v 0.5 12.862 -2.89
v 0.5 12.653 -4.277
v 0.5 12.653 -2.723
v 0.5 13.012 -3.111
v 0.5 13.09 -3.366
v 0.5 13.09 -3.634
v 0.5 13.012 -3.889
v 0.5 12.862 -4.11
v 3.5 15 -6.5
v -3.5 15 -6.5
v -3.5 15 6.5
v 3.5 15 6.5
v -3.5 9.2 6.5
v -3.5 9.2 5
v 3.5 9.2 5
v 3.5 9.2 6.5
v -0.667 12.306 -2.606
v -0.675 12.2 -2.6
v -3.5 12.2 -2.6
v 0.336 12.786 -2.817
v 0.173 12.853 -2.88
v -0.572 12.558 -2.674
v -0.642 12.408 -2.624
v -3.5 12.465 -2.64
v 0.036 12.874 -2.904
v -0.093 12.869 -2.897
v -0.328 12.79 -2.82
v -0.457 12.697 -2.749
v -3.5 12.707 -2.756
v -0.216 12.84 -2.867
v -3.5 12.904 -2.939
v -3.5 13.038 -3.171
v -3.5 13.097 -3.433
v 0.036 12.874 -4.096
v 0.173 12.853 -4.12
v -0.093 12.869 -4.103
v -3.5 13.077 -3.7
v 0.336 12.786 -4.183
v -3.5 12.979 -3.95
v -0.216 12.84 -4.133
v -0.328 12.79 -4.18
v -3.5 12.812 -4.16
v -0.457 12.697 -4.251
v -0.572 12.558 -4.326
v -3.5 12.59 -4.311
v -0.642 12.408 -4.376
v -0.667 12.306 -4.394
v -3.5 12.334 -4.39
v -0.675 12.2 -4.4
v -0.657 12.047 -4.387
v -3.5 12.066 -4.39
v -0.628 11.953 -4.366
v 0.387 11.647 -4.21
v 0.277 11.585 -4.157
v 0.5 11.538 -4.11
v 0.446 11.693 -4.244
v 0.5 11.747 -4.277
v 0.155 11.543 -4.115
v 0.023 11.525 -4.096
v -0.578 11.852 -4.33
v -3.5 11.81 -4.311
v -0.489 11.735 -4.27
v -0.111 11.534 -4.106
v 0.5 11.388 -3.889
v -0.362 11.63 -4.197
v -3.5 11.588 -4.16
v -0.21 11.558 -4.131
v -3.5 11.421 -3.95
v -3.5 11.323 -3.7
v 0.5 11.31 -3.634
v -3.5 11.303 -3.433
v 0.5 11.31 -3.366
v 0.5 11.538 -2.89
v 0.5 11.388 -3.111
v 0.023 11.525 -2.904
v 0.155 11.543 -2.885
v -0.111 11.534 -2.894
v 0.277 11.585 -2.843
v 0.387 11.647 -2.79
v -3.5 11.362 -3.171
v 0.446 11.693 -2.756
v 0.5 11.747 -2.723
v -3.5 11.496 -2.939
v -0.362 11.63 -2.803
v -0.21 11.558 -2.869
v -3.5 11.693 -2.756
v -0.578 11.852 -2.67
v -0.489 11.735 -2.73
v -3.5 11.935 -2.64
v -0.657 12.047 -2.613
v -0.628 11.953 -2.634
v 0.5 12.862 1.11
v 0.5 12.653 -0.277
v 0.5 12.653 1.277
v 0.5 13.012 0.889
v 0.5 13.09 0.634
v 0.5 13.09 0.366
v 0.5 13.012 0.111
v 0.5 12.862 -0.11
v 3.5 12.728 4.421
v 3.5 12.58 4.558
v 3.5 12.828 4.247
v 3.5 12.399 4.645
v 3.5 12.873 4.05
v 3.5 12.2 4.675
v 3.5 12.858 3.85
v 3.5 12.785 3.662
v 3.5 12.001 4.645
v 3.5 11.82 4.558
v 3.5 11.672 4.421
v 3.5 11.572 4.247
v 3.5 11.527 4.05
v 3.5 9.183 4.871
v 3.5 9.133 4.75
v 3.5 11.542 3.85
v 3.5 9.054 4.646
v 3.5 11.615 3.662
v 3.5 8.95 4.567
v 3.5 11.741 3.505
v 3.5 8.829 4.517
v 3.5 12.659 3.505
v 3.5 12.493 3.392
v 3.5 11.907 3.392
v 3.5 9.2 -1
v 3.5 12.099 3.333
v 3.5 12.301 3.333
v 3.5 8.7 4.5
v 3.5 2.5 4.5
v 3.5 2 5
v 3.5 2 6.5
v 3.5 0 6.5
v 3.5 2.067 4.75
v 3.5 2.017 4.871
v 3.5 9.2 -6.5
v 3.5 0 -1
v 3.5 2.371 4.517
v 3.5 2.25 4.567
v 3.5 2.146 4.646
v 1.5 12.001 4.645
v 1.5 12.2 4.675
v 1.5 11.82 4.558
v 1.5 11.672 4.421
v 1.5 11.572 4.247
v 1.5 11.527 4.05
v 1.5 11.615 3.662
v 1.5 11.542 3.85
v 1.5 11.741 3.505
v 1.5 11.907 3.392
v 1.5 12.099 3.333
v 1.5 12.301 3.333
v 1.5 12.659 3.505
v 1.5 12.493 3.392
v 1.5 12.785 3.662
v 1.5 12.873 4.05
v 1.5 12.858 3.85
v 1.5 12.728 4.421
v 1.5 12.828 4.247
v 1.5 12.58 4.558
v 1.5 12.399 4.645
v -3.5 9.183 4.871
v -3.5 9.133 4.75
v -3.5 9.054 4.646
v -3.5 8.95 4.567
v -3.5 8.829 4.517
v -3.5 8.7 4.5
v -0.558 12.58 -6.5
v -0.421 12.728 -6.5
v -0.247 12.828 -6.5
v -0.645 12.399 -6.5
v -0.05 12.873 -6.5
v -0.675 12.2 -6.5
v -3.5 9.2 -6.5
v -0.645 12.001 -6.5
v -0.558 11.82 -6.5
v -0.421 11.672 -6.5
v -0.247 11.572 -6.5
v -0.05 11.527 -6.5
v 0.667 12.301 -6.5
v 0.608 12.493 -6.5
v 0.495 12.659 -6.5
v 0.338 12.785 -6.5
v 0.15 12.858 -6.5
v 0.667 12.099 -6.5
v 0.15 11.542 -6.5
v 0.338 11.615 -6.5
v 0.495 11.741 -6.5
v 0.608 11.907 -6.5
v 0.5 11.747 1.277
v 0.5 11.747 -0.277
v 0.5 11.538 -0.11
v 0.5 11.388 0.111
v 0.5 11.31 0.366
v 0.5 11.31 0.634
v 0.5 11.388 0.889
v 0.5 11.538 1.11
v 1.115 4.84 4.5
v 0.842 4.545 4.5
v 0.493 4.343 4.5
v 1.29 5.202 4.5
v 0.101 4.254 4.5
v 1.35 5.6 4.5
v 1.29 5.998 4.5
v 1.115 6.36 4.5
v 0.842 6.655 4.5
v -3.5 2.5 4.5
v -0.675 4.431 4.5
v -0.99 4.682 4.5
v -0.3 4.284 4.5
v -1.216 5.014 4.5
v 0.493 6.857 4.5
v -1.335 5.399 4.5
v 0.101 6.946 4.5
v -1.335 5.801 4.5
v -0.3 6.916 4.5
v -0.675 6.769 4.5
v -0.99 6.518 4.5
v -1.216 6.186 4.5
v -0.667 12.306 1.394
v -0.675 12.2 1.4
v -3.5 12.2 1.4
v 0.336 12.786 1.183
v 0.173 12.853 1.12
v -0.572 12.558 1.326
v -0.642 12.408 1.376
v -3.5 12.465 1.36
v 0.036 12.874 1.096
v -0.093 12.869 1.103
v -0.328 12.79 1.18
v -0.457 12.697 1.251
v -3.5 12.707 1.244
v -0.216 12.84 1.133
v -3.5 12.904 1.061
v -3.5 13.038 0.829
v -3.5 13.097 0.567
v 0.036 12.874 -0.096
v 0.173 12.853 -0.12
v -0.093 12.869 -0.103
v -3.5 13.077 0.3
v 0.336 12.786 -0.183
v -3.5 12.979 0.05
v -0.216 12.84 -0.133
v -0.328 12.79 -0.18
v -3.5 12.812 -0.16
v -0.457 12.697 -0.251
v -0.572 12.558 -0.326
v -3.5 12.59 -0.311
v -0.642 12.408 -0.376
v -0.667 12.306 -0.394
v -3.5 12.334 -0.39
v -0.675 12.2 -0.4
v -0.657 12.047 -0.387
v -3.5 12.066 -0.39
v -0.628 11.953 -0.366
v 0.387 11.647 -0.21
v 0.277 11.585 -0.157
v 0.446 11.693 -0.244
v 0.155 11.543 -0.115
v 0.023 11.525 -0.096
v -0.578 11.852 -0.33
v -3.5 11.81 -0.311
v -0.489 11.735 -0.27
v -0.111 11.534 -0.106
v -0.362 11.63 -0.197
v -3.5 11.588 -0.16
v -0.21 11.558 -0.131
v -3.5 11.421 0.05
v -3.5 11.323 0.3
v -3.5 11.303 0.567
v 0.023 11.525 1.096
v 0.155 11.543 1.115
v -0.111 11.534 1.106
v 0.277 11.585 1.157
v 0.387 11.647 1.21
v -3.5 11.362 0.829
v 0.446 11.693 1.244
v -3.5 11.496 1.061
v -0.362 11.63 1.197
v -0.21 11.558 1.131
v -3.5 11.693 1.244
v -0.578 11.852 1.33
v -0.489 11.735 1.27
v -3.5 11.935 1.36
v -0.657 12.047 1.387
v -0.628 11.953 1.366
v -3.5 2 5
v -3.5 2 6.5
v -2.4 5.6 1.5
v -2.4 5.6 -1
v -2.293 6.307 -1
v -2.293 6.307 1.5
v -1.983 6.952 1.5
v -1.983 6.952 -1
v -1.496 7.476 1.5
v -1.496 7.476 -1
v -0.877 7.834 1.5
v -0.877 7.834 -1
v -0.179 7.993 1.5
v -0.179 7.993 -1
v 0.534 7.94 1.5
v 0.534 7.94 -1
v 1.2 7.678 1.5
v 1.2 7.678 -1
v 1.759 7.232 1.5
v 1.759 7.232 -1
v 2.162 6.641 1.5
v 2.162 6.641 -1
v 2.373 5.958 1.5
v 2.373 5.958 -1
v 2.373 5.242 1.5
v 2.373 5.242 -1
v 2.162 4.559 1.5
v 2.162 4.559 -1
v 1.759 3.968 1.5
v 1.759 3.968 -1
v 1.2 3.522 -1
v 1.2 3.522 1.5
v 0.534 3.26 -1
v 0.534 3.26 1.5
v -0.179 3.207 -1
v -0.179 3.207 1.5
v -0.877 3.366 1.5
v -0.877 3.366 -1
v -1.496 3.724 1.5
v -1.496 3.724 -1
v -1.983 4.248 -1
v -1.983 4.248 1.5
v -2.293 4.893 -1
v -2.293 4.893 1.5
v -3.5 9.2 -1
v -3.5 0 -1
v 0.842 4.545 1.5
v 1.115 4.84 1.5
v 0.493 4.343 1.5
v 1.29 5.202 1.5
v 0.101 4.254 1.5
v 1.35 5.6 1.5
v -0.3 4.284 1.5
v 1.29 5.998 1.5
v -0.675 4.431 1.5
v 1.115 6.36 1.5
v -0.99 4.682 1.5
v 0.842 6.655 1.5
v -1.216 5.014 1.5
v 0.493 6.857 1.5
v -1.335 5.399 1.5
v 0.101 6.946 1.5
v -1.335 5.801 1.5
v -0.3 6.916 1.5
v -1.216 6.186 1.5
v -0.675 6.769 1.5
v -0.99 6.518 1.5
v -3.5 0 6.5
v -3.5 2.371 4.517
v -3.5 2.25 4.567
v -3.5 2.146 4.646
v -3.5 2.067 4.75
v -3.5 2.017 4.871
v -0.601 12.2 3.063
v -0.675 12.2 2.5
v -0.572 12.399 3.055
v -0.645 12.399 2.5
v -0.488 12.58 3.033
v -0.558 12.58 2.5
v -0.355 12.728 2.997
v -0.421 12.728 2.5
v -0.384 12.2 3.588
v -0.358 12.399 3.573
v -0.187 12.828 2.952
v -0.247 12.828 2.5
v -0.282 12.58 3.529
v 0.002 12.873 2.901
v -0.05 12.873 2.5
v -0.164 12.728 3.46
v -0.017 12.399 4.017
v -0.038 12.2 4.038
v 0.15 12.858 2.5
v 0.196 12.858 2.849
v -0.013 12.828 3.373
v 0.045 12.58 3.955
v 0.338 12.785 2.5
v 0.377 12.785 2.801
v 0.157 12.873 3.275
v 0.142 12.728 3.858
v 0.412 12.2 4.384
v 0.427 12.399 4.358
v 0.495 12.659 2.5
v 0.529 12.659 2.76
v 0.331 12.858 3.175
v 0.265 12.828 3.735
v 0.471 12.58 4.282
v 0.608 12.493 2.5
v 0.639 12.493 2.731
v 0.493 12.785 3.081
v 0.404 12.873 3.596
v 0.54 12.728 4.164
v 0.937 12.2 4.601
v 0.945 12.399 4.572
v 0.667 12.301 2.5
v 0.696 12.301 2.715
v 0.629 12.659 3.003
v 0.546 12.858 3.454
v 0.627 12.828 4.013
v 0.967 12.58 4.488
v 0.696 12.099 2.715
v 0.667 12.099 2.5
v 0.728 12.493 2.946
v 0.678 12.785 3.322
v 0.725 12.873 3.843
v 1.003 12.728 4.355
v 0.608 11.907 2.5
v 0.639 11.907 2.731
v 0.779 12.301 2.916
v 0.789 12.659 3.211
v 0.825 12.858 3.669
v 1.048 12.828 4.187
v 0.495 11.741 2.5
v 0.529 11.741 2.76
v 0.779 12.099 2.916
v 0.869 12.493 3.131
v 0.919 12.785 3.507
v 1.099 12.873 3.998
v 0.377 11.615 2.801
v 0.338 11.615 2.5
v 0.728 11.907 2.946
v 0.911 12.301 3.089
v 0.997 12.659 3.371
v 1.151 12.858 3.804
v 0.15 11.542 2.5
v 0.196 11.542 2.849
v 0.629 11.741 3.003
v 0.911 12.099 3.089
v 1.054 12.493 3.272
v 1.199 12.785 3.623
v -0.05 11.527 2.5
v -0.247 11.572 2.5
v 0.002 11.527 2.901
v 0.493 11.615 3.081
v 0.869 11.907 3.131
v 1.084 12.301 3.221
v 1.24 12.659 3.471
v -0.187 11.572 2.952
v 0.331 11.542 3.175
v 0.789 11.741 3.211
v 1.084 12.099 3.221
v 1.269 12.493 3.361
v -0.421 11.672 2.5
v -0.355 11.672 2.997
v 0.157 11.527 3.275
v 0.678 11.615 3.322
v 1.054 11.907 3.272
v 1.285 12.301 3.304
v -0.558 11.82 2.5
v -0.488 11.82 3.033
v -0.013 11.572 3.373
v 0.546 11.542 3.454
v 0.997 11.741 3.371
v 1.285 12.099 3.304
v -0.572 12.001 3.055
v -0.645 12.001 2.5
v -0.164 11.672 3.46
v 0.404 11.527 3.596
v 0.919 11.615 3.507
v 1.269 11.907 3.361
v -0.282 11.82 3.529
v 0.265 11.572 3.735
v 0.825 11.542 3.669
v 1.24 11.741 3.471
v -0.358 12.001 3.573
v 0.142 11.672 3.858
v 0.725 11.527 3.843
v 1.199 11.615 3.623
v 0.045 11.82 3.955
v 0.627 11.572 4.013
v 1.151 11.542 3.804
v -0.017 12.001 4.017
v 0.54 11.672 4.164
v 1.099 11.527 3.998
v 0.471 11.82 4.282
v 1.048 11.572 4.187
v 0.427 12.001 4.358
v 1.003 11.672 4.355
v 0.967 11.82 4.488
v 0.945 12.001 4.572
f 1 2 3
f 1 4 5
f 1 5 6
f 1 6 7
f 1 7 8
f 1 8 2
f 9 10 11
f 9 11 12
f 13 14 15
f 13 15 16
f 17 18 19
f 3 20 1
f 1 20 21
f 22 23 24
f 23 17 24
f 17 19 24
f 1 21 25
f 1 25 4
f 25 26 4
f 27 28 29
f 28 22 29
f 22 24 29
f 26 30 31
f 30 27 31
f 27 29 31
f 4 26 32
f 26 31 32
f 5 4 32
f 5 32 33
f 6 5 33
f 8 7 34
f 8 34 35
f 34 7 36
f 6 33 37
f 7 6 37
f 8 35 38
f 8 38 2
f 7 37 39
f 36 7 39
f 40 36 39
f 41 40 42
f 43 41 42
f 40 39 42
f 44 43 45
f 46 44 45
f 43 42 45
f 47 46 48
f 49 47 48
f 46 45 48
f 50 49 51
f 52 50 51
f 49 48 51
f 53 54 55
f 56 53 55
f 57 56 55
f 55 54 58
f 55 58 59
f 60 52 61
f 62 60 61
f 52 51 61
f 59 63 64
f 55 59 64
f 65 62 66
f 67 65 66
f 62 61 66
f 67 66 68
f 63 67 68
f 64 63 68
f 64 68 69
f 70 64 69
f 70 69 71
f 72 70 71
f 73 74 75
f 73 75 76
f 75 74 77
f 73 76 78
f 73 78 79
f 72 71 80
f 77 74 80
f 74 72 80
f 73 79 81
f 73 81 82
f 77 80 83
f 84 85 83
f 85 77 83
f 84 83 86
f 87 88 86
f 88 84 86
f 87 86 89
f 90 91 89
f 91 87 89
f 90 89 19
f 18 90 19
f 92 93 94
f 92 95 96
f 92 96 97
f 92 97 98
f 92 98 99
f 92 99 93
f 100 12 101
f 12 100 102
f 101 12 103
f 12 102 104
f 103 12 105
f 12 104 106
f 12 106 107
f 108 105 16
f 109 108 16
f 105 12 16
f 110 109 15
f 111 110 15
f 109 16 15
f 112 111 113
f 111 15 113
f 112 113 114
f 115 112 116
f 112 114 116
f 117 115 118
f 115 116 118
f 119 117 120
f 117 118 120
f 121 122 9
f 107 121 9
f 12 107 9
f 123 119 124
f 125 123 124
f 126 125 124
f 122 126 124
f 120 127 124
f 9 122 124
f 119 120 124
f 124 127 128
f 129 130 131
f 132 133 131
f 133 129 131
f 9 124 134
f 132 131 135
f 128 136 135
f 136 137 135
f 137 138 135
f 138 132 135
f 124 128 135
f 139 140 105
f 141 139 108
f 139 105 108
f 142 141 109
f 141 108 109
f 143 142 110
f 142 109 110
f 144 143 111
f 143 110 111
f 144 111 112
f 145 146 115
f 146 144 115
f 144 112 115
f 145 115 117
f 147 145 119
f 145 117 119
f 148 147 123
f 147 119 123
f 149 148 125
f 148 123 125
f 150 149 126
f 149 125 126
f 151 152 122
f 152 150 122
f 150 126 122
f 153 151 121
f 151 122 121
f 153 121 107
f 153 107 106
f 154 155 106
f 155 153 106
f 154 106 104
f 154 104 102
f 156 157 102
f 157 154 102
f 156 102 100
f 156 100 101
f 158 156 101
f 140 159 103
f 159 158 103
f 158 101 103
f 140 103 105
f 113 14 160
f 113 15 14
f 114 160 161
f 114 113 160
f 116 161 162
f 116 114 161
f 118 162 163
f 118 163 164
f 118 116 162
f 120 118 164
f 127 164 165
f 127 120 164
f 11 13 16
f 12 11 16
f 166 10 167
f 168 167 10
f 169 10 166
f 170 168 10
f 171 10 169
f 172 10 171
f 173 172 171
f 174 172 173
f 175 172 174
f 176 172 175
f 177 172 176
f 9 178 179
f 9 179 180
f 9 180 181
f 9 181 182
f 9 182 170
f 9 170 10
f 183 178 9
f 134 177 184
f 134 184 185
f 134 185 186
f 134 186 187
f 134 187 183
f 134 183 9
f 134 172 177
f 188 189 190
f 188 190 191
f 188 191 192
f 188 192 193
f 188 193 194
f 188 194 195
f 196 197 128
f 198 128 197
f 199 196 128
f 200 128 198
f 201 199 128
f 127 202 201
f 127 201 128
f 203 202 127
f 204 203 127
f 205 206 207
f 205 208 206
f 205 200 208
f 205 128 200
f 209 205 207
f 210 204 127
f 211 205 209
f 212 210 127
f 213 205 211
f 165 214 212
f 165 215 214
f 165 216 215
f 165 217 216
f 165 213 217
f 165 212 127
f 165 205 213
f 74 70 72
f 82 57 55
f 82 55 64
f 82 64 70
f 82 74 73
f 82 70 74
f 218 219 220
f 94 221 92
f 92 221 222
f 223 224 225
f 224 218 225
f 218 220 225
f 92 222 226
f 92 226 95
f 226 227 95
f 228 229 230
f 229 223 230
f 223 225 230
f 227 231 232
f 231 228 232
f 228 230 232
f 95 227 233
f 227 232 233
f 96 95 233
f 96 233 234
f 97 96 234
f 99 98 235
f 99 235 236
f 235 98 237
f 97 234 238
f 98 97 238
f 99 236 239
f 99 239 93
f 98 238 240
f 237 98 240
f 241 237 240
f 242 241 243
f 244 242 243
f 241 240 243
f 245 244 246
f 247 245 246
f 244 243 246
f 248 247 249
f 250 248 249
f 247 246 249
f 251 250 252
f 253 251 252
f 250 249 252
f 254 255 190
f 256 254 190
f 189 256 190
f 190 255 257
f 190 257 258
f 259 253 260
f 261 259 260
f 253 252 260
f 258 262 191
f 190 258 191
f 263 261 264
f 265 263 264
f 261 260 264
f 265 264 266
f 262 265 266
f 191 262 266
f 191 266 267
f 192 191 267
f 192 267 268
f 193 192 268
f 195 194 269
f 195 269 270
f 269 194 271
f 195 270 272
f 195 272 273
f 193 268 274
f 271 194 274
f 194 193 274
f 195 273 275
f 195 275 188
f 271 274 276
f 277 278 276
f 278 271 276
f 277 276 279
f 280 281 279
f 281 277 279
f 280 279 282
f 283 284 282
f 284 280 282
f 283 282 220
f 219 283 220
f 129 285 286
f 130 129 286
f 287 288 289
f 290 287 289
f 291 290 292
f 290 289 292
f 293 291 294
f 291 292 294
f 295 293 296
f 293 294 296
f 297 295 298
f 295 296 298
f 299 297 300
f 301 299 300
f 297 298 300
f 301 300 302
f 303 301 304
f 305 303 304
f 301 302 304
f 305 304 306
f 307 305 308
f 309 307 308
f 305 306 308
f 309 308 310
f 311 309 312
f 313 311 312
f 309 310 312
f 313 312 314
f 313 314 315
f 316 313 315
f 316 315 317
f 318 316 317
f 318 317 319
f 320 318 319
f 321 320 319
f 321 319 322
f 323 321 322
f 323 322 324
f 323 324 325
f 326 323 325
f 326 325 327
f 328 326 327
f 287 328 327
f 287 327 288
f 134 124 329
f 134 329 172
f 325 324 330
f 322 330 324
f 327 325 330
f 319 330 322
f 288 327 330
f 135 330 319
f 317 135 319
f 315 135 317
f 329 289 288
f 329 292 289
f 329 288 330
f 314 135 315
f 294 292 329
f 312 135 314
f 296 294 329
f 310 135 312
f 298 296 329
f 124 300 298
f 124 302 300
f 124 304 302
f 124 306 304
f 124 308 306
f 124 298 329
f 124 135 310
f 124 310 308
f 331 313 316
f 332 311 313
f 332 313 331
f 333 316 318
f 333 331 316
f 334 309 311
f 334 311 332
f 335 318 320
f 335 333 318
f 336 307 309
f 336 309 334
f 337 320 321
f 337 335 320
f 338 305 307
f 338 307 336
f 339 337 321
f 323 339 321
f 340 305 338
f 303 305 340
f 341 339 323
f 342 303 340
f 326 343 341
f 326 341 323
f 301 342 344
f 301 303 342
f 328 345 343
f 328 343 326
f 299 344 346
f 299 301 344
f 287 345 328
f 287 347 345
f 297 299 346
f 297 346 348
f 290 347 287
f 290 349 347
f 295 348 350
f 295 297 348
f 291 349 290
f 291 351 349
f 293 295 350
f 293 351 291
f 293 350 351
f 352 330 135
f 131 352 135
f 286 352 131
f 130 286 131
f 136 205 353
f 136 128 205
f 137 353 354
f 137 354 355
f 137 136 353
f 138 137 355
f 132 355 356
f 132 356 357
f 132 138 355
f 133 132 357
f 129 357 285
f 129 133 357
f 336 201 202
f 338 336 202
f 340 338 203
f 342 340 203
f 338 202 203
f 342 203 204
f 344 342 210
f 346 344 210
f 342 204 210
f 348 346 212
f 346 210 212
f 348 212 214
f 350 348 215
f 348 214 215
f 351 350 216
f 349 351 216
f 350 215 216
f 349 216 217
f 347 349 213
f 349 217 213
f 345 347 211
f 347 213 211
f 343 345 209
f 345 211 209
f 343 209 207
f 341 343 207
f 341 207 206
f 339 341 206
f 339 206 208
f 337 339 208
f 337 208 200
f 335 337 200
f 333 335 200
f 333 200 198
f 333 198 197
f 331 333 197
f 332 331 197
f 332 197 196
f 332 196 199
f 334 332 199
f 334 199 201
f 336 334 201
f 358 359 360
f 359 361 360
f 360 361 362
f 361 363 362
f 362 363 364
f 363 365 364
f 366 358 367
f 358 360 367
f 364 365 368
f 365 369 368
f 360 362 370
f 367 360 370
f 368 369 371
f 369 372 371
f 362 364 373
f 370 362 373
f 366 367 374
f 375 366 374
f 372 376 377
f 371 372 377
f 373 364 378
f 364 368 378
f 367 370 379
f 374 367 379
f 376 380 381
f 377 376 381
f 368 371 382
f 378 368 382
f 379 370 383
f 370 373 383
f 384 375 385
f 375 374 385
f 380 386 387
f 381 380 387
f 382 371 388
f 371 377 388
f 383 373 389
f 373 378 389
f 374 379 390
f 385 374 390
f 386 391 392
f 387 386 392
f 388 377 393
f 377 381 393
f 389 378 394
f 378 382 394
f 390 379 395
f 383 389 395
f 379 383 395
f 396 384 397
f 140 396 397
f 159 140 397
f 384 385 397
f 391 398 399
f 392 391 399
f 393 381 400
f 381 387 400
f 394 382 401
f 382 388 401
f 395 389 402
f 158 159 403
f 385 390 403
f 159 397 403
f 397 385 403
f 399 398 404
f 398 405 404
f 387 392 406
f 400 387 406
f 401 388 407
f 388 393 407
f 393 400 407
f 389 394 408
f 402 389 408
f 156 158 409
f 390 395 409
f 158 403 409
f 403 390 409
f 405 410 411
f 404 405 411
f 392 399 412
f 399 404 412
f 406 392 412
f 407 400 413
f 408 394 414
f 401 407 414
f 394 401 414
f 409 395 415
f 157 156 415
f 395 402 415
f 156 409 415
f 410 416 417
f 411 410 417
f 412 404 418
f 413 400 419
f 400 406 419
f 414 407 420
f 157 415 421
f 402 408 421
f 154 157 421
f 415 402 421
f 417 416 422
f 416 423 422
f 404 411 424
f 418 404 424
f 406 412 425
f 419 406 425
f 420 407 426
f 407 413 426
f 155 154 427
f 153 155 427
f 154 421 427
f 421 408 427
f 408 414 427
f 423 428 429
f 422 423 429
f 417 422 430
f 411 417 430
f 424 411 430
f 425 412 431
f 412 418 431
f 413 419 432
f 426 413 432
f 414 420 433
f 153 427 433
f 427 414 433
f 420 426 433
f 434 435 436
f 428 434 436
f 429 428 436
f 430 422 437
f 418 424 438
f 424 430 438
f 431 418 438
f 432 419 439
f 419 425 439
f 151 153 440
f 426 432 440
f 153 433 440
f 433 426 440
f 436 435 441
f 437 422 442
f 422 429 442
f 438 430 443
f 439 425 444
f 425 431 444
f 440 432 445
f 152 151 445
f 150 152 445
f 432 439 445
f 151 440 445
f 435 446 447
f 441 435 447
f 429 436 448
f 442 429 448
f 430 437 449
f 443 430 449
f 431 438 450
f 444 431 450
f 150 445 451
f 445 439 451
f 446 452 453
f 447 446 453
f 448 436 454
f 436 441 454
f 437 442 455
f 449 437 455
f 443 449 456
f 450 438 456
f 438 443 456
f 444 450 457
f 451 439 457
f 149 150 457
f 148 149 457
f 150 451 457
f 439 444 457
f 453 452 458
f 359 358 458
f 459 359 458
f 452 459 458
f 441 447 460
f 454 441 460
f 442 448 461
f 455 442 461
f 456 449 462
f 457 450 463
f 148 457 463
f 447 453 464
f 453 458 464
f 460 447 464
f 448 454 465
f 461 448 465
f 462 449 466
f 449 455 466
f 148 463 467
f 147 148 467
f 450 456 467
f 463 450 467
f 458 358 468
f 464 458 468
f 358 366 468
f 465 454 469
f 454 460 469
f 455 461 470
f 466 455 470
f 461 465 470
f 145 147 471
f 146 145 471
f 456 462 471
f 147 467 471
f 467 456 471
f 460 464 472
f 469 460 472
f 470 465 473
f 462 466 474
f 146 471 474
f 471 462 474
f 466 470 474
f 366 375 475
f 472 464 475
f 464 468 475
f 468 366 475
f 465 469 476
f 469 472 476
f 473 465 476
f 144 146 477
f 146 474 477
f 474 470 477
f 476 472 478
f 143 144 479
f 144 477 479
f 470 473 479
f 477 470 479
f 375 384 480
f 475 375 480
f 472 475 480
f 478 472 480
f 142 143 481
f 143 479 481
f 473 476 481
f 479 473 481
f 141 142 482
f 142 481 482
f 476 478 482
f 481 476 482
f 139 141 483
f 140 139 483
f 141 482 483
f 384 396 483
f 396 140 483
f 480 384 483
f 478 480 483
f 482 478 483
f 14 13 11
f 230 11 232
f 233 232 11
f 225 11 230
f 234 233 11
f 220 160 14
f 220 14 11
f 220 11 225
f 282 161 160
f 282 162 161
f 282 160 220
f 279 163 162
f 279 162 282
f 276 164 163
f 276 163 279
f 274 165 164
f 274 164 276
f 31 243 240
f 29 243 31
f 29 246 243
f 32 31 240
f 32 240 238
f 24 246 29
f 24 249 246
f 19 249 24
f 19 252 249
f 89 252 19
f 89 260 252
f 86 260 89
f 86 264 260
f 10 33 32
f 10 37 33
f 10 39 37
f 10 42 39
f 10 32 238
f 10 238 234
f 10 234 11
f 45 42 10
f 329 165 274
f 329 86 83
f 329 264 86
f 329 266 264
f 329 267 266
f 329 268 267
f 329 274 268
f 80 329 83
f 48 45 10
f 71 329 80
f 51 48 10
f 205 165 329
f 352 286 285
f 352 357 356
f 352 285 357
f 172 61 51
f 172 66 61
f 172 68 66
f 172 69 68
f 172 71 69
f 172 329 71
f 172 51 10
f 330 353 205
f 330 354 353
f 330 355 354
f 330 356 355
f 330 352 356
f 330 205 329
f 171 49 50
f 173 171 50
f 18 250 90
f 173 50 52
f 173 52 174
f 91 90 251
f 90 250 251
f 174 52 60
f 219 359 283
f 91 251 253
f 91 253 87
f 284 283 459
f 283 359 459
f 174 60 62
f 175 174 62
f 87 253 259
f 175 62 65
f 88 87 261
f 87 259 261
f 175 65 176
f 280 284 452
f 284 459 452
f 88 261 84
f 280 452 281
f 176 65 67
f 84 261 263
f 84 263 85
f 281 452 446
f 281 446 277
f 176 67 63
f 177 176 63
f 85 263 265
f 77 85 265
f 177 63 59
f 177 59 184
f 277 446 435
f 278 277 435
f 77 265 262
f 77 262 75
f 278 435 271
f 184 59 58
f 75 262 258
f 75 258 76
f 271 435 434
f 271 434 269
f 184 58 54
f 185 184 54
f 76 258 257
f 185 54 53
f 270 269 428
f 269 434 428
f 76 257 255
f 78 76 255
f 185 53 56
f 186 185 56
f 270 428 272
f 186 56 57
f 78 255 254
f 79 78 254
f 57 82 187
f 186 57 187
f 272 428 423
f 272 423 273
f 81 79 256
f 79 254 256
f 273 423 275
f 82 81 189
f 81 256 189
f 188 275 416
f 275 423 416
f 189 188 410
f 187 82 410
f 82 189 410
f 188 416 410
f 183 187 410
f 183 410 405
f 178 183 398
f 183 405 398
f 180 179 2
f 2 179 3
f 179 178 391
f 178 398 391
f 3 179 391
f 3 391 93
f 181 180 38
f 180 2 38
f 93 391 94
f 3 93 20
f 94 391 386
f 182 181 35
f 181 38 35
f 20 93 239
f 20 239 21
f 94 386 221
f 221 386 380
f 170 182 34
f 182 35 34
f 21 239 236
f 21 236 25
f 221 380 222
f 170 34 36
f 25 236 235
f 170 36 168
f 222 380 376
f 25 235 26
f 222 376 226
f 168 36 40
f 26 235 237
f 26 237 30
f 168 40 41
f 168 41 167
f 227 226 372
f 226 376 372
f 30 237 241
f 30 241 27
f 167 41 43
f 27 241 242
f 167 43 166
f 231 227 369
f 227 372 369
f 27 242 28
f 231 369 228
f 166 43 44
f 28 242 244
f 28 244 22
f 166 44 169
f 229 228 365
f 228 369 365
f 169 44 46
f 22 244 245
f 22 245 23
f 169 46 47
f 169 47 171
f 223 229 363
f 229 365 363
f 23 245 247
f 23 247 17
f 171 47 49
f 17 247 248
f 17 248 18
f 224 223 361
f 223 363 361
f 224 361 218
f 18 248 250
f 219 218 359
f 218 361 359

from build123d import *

# Parameters (mm, degrees)
SKETCH1_W           = 7
SKETCH1_H           = 13
BOSS_EXTRUDE1_DEPTH = 15
SKETCH9_W           = 2
SKETCH9_H           = 7.2
CUT_EXTRUDE6_DEPTH  = 18.783419244
SKETCH20_R          = 1.35
CUT_EXTRUDE13_DEPTH = 19.927493231
SKETCH21_R          = 2.4
CUT_EXTRUDE14_DEPTH = 8
FILLET1_R           = 0.5
SKETCH17_R          = 0.675
SKETCH19_R          = 0.9
CUT_EXTRUDE12_DEPTH = 4
SKETCH22_W          = 5.5
SKETCH22_H          = 9.2
CUT_EXTRUDE15_DEPTH = 18.78341932


with BuildPart() as part:
    # Sketch1 → Boss-Extrude1 (new body)
    with BuildSketch(Plane(origin=(0, 0, 0), x_dir=(1, 0, 0), z_dir=(0, 1, 0))):
        Rectangle(SKETCH1_W, SKETCH1_H)
    extrude(amount=BOSS_EXTRUDE1_DEPTH)

    # Sketch9 → Cut-Extrude6 (cut, through all)
    with BuildSketch(Plane.ZY.offset(3.5)):
        with Locations((5.5, 5.6)):
            Rectangle(SKETCH9_W, SKETCH9_H)
    extrude(amount=-CUT_EXTRUDE6_DEPTH, mode=Mode.SUBTRACT)

    # Sketch20 → Cut-Extrude13 (cut, through all)
    with BuildSketch(Plane.XY.offset(4.5)):
        with Locations((0, 5.6)):
            Circle(SKETCH20_R)
    extrude(amount=-CUT_EXTRUDE13_DEPTH, mode=Mode.SUBTRACT)

    # Sketch21 → Cut-Extrude14 (cut)
    with BuildSketch(Plane(origin=(0, 0, -6.5), x_dir=(-1, 0, 0), z_dir=(0, 0, -1))):
        with Locations((0, 5.6)):
            Circle(SKETCH21_R)
    extrude(amount=-CUT_EXTRUDE14_DEPTH, mode=Mode.SUBTRACT)

    # Fillet1
    fillet1_edges = [part.edges().sort_by_distance(p)[0] for p in [
        (0, 2, 4.5),
        (0, 9.2, 4.5),
    ]]
    fillet(fillet1_edges, radius=FILLET1_R)

    # Cut-Sweep1: sweep along a path in Sketch16
    with BuildLine(Plane(origin=(0, 12.2, 0), x_dir=(-1, 0, 0), z_dir=(0, -1, 0))) as cut_sweep1_path:
        Line((0, 6.5), (0, -2.5))
        ThreePointArc((0, -2.5), (-0.439339828, -3.560660172), (-1.5, -4))
        Line((-1.5, -4), (-3.5, -4))
    # Sketch17 → Cut-Sweep1 (sweep, cut)
    with BuildSketch(Plane(origin=(0, 0, -6.5), x_dir=(-1, 0, 0), z_dir=(0, 0, -1))):
        with Locations((0, 12.2)):
            Circle(SKETCH17_R)
    sweep(path=cut_sweep1_path.line, mode=Mode.SUBTRACT)

    # Sketch19 → Cut-Extrude12 (cut)
    with BuildSketch(Plane.ZY.offset(3.5)):
        with Locations((0.5, 12.2)):
            Circle(SKETCH19_R)
        with Locations((-3.5, 12.2)):
            Circle(SKETCH19_R)
    extrude(amount=-CUT_EXTRUDE12_DEPTH, mode=Mode.SUBTRACT)

    # Sketch22 → Cut-Extrude15 (cut, through all)
    with BuildSketch(Plane(origin=(3.5, 0, 0), x_dir=(0, 0, -1), z_dir=(1, 0, 0))):
        with Locations((3.75, 4.6)):
            Rectangle(SKETCH22_W, SKETCH22_H)
    extrude(amount=-CUT_EXTRUDE15_DEPTH, mode=Mode.SUBTRACT)


solid = part.part
